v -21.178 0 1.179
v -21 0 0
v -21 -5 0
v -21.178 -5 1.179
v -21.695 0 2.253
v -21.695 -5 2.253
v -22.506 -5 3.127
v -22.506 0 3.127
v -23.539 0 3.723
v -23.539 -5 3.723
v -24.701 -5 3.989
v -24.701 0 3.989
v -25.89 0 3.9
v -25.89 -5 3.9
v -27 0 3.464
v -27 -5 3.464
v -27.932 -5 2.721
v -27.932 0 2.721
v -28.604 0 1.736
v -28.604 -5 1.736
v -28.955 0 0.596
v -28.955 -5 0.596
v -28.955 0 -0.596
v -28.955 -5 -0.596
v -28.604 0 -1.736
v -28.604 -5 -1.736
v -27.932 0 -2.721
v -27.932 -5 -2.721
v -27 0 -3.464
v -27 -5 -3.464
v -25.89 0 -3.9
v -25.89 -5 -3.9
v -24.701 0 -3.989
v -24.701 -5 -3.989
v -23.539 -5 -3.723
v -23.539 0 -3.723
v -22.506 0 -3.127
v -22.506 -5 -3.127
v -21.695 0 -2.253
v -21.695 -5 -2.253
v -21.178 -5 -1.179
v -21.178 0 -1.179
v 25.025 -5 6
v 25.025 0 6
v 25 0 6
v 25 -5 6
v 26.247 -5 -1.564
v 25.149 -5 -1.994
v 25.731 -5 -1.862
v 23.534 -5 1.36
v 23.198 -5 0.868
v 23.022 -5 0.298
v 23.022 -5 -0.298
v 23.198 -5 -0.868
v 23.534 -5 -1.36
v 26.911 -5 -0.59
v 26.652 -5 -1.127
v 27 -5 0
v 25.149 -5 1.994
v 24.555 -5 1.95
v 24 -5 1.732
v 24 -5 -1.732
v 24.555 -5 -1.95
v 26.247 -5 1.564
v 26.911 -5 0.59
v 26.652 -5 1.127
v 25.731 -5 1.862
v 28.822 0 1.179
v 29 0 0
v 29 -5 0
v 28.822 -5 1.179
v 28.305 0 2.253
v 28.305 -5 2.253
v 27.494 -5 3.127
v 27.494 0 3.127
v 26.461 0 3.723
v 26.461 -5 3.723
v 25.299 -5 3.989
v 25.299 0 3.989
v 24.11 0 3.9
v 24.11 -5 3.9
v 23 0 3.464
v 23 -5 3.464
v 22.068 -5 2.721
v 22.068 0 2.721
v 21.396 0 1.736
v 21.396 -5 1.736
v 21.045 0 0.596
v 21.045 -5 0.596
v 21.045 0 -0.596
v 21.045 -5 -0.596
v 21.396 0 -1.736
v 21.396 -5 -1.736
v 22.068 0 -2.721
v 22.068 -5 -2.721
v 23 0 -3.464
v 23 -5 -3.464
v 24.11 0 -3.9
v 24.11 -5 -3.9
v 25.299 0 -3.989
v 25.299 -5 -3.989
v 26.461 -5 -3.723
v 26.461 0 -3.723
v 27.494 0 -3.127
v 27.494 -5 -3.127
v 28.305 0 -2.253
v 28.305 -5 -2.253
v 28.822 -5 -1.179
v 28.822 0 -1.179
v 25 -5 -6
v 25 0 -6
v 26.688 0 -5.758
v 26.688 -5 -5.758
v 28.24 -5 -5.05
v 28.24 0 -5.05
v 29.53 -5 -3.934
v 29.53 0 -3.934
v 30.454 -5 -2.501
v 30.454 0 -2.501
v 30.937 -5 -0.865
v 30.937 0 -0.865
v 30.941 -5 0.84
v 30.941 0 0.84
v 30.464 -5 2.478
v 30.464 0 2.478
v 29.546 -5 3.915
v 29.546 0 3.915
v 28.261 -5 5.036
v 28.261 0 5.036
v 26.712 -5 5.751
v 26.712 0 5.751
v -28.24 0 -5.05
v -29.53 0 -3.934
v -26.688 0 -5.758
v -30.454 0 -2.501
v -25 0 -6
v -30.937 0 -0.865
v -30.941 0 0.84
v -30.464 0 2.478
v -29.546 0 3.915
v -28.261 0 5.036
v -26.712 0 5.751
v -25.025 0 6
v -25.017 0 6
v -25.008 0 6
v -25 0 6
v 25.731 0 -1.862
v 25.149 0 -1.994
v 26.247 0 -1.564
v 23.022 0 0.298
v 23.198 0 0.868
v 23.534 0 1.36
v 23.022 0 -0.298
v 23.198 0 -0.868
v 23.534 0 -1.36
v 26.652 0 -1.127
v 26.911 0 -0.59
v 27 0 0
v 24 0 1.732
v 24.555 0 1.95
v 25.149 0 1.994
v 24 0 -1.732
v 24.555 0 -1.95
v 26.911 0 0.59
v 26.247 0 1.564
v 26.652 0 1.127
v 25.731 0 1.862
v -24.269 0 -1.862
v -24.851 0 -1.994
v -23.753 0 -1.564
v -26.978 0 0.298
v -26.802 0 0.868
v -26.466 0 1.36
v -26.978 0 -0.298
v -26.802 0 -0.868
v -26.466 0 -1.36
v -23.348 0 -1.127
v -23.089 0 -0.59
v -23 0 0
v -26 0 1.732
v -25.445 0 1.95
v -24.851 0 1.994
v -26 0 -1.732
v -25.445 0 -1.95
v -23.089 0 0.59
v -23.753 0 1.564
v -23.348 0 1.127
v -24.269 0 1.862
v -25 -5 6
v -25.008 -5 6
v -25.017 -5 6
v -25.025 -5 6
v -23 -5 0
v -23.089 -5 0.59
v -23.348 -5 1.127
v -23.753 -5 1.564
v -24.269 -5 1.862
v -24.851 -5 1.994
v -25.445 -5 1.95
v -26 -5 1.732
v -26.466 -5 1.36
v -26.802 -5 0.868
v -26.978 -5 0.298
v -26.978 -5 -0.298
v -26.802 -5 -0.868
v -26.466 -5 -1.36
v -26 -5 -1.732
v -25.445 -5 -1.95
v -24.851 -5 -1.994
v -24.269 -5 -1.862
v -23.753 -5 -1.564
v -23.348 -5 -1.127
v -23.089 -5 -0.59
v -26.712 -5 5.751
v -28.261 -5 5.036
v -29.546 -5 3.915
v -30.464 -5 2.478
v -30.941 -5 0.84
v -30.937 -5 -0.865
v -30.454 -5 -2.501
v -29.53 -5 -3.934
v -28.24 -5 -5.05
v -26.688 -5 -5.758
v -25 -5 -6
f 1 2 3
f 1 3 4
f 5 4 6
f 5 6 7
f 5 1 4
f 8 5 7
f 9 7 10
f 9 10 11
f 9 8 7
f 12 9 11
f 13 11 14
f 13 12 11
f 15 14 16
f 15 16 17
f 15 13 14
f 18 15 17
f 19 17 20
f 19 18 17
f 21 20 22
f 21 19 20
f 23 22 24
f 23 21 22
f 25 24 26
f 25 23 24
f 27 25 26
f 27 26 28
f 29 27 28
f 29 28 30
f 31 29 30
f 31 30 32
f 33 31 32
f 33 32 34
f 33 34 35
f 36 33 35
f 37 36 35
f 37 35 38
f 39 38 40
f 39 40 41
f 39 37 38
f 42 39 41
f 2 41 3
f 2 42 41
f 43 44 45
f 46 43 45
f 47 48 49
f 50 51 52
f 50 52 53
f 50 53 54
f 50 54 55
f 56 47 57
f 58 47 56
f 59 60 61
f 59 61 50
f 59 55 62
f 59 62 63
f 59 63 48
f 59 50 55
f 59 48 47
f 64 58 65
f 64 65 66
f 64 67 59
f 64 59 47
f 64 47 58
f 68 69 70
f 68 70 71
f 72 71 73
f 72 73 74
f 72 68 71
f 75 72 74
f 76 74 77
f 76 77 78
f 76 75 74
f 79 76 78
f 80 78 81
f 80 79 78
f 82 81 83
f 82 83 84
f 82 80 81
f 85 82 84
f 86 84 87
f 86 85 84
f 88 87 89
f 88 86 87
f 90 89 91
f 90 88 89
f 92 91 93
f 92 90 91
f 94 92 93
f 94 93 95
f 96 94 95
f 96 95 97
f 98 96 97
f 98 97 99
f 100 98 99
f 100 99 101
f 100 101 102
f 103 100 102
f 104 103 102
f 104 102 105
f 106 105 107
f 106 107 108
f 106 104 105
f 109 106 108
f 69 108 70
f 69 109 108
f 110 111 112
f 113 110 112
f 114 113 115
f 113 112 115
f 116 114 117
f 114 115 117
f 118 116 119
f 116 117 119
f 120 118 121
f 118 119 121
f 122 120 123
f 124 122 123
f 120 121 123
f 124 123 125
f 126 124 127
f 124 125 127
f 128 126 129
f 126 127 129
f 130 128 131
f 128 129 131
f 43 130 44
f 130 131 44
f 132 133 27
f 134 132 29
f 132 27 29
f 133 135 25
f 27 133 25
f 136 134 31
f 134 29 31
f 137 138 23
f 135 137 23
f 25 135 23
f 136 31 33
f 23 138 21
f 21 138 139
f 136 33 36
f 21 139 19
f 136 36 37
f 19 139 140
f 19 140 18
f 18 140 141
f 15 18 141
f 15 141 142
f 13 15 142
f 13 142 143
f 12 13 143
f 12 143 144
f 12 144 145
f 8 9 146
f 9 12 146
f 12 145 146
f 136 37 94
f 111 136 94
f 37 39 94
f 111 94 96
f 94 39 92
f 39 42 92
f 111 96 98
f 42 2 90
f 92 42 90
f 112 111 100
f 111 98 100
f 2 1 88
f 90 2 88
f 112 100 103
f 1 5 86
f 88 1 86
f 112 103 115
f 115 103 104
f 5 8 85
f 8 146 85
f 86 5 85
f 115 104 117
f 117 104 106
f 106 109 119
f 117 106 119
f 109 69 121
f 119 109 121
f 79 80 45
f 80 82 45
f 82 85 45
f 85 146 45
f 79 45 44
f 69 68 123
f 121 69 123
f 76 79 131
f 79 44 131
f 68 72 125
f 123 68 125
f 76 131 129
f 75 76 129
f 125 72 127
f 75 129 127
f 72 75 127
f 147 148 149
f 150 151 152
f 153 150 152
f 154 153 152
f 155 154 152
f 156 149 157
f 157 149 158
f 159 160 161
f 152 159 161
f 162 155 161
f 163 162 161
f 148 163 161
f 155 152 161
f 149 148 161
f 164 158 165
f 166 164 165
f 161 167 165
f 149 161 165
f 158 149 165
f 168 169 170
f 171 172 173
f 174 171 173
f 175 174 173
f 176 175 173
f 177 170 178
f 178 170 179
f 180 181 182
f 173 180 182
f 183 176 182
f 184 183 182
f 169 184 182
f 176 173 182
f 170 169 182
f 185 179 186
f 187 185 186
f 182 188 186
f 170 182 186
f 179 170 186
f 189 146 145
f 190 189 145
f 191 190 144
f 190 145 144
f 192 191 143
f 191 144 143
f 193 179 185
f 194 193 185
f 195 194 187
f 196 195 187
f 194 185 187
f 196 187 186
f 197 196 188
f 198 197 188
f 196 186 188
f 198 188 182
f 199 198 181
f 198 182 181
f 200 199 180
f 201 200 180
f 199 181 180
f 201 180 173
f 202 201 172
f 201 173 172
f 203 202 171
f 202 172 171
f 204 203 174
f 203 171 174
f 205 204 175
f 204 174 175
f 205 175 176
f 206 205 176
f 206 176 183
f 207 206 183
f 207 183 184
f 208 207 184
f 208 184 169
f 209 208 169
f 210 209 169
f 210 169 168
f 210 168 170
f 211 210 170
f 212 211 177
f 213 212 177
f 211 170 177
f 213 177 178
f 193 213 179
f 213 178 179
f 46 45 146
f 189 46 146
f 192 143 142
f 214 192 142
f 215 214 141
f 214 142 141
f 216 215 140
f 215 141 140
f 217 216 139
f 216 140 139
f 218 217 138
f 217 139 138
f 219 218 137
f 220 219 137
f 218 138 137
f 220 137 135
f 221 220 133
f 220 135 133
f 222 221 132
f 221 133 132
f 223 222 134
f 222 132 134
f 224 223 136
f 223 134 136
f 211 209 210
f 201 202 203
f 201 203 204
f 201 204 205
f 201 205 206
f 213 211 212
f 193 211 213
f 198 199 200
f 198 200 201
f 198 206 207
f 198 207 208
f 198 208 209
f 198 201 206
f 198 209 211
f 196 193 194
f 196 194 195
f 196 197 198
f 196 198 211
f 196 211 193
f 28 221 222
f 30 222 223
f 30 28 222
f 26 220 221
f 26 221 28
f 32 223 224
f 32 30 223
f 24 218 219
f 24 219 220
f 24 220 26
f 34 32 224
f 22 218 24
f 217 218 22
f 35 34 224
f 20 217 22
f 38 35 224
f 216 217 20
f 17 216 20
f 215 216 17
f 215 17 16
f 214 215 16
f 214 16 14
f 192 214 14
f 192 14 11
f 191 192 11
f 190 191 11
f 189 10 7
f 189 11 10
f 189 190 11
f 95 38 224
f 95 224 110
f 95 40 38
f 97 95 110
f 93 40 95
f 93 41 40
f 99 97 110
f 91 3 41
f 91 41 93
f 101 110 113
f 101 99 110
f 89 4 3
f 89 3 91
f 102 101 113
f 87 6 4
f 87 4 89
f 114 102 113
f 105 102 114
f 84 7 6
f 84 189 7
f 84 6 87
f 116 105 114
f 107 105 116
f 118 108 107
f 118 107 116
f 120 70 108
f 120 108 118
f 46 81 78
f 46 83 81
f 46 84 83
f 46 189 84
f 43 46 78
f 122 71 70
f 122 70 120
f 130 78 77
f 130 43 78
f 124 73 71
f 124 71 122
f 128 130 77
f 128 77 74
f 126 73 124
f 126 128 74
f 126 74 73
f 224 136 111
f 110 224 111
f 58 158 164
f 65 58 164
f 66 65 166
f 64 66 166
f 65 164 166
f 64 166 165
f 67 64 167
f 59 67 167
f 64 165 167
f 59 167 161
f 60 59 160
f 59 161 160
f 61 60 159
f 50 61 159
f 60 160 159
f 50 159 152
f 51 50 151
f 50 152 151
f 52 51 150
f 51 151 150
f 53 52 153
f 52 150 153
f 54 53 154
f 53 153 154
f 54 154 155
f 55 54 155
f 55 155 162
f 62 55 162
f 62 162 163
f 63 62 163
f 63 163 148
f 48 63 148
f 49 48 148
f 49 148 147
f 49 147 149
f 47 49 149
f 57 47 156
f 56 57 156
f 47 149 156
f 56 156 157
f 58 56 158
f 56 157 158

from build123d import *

# Parameters (mm, degrees)
F0_R     = 4
F1_DEPTH = 5
F0_R_2   = 2


# Not quite as in the source:
# - ends of sketch curves that miss each other by under 0.0002 mm in the source are joined


with BuildPart() as f1:
    # F0 (on Front) → F1 (new body)
    with BuildSketch(Plane.XZ):
        with BuildLine():
            Line((0, 6), (-25, 6))
            ThreePointArc((-25, 6), (-25.0125245304, 5.999986928), (-25.0250490062, 5.999947712))
            ThreePointArc((-25.0250490062, 5.999947712), (-30.999986928, -0.0125245304), (-25, -6))
            Line((-25, -6), (0, -6))
            Line((0, -6), (25, -6))
            ThreePointArc((25, -6), (30.999986928, -0.0125245304), (25.0250490062, 5.999947712))
            Line((25.0250490062, 5.999947712), (25, 6))
            Line((25, 6), (0, 6))
        make_face()
        with Locations((-25, 0)):
            Circle(F0_R, mode=Mode.SUBTRACT)
        with Locations((25, 0)):
            Circle(F0_R, mode=Mode.SUBTRACT)
    extrude(amount=F1_DEPTH)


with BuildPart() as f1b:
    # F0 (on Front) → F1, piece 2 (new body)
    with BuildSketch(Plane.XZ):
        with Locations((-25, 0)):
            Circle(F0_R_2)
    extrude(amount=F1_DEPTH)


with BuildPart() as f1c:
    # F0 (on Front) → F1, piece 3 (new body)
    with BuildSketch(Plane.XZ):
        with Locations((25, 0)):
            Circle(F0_R_2)
    extrude(amount=F1_DEPTH)


solid = Compound([f1.part, f1b.part, f1c.part])
